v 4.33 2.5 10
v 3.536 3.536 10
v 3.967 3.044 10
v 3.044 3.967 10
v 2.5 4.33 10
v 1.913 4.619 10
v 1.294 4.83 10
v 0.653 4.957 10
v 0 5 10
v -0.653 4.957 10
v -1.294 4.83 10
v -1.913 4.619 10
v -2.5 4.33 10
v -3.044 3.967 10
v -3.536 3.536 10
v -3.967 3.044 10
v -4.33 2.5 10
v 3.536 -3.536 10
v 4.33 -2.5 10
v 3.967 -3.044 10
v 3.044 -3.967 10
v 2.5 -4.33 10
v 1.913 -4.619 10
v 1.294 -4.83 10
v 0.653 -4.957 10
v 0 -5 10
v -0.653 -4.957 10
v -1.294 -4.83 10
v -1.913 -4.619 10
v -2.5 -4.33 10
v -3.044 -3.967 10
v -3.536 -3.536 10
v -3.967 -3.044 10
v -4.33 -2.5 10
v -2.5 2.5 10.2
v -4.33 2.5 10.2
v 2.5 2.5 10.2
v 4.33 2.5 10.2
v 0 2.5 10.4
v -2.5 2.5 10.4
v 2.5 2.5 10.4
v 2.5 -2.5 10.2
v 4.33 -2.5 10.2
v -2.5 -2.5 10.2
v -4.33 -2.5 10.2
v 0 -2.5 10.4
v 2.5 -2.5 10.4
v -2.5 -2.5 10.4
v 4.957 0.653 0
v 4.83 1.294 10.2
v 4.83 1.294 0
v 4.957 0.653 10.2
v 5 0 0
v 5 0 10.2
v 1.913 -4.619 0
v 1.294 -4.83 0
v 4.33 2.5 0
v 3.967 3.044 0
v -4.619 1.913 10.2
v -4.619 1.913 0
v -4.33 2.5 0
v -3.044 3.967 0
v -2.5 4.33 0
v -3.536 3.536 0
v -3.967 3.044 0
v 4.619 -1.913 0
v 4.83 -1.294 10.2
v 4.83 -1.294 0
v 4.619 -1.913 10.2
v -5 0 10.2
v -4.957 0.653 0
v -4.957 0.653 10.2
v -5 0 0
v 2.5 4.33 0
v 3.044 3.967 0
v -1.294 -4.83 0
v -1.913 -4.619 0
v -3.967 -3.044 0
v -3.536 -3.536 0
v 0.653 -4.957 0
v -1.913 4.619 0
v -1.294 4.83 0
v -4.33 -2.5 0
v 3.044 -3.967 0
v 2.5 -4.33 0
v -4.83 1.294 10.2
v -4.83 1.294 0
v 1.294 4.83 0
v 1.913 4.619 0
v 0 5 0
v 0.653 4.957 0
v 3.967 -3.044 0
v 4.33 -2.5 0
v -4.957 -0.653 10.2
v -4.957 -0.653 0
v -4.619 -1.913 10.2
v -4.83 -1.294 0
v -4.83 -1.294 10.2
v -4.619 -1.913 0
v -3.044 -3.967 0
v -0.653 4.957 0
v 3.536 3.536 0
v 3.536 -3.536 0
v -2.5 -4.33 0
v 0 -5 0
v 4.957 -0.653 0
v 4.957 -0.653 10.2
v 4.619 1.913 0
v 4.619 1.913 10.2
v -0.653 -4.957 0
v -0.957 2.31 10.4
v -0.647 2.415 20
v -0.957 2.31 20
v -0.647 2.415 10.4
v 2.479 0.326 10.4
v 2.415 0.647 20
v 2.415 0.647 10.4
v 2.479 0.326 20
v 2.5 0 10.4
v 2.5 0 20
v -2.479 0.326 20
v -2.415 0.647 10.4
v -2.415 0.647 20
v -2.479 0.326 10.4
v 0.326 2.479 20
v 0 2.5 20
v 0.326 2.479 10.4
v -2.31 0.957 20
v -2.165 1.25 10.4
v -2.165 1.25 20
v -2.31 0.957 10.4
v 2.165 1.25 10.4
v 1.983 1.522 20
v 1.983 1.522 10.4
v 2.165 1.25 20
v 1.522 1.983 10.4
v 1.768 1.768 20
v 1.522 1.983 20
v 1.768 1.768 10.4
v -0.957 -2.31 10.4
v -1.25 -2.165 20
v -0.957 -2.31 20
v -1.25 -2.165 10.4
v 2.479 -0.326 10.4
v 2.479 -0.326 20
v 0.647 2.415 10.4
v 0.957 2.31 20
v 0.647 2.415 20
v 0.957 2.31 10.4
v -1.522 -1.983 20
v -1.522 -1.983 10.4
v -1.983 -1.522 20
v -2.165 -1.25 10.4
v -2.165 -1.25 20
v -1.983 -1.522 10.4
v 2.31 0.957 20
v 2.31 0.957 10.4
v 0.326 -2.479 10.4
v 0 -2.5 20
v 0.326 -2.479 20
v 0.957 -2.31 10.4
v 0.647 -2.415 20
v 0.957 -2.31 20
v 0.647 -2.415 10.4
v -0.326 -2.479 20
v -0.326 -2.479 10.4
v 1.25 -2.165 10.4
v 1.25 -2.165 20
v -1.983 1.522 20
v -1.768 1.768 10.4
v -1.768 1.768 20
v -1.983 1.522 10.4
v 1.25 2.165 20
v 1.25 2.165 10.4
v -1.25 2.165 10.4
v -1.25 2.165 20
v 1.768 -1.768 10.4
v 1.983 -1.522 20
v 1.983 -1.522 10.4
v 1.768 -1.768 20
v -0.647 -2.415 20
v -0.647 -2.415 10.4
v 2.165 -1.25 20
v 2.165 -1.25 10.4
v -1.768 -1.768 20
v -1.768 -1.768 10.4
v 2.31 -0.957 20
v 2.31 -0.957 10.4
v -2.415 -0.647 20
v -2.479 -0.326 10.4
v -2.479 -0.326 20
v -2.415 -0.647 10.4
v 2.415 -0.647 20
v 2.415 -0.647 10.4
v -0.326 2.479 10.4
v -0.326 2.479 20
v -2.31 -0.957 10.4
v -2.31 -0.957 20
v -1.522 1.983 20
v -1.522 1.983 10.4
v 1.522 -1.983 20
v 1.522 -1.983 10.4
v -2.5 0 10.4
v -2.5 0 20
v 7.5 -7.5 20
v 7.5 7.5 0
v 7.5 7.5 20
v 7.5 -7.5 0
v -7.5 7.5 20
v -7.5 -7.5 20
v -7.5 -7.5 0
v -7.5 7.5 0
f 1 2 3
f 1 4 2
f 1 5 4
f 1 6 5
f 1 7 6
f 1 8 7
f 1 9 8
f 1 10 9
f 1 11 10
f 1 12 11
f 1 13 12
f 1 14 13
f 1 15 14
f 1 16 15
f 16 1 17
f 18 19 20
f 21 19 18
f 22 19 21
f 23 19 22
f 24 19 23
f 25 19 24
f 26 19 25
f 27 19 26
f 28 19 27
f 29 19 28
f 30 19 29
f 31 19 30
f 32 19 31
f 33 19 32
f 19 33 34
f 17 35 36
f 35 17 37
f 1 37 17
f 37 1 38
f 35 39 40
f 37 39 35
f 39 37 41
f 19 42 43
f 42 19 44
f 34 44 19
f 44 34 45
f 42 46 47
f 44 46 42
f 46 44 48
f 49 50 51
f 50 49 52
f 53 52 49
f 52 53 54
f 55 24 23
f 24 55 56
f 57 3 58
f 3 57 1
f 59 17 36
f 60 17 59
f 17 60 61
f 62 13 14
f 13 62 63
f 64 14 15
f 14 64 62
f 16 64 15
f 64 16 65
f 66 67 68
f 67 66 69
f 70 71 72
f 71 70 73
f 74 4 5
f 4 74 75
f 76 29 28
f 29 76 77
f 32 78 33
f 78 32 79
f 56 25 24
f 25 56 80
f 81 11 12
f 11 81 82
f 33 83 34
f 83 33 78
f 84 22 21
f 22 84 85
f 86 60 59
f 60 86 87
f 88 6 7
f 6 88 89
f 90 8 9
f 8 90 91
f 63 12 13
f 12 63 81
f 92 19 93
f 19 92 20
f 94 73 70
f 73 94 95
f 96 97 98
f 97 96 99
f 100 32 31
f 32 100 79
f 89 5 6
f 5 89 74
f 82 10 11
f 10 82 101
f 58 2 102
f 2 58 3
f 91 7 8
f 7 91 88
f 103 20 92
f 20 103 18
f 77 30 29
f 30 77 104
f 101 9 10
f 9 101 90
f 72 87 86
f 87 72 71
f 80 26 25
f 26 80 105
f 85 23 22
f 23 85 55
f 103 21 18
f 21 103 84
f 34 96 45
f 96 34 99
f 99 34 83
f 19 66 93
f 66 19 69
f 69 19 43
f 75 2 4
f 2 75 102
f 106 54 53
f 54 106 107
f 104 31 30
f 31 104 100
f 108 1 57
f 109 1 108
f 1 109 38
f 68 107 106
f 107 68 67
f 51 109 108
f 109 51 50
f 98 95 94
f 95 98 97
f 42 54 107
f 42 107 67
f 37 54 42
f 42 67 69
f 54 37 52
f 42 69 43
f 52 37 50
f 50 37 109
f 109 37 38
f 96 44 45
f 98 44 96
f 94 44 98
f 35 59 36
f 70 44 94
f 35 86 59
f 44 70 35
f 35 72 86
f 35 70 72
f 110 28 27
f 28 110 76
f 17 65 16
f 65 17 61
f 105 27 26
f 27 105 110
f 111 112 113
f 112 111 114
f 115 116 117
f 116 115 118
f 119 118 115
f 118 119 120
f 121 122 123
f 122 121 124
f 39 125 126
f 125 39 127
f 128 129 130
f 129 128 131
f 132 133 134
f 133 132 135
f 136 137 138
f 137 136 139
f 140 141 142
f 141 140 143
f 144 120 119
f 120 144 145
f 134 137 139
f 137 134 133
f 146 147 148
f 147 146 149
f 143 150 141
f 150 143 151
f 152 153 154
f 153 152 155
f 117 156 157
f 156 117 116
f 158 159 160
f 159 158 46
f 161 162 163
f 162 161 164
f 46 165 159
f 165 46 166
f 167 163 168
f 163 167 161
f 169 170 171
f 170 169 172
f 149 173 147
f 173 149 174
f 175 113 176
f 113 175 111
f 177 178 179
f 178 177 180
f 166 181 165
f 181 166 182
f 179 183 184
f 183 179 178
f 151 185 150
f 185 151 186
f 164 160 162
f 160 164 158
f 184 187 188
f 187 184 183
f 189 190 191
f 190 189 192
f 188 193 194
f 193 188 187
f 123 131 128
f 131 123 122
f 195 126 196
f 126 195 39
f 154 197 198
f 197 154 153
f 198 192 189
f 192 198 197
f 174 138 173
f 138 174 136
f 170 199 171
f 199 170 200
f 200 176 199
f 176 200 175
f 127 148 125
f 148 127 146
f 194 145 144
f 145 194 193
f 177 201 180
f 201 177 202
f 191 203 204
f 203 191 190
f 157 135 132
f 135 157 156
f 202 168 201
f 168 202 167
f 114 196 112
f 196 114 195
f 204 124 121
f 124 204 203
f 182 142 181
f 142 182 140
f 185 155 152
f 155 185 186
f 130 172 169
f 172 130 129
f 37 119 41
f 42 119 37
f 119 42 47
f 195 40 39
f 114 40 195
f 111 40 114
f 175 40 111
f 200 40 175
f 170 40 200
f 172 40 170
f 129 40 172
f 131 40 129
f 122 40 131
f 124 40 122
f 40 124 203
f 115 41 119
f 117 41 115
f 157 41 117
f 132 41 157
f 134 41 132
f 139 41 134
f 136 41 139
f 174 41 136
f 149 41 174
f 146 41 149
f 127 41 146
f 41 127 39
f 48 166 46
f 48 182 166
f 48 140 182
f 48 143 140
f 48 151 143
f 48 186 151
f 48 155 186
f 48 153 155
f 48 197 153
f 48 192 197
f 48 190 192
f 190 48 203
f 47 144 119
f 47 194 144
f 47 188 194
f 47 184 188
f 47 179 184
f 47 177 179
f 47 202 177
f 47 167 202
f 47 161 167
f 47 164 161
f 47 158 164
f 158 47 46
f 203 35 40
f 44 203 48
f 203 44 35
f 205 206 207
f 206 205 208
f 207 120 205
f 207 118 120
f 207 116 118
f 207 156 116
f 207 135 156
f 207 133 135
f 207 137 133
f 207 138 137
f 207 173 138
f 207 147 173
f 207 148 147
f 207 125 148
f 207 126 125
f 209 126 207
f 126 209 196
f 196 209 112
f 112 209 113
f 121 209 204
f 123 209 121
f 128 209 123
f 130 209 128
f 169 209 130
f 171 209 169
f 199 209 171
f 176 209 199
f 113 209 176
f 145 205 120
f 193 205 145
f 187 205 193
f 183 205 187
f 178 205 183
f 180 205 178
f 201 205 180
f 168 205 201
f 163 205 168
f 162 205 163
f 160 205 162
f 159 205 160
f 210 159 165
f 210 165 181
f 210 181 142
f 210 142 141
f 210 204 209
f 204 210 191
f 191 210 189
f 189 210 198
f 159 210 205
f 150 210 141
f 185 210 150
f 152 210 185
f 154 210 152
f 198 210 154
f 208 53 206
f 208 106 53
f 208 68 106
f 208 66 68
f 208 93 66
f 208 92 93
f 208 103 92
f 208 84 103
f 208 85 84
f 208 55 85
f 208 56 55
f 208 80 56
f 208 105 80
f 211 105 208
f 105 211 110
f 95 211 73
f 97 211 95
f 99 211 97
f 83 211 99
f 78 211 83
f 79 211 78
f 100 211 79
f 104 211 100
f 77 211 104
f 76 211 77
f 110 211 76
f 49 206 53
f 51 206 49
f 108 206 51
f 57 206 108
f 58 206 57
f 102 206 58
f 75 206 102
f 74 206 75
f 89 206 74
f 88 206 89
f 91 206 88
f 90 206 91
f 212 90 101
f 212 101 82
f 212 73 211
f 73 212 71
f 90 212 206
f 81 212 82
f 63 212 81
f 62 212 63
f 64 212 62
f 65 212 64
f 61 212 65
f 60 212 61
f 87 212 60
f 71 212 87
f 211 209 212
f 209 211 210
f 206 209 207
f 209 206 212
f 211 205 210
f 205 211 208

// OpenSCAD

diamLower = 10;
diamUpper = 5;
lenLower = 10;
lenUpper = 10;
layerThickness = 0.2;
circleEdges = 48;

FN = circleEdges;

difference()
{
  translate([0, 0, (lenLower+lenUpper) / 2])
    cube([diamLower+5, diamLower+5, lenLower+lenUpper], true);
  union()
  {
    difference()
    {
      translate([0, 0, -1])
      cylinder(lenLower + layerThickness+1, diamLower/2, diamLower/2, $fn = FN);
      translate([0, 0, lenUpper+layerThickness])
        difference()
        {
          cube([diamLower+1, diamLower+1, 2*layerThickness], true);
          cube([diamLower+2, diamUpper, 2*layerThickness+1], true);
        }
    }
    translate([0, 0, lenLower + layerThickness])
      cylinder(lenUpper - layerThickness+1, diamUpper/2, diamUpper/2, $fn = FN);
    translate([0, 0, lenLower + layerThickness*1.5])
      cube([diamUpper, diamUpper, layerThickness], true);
  }
}
